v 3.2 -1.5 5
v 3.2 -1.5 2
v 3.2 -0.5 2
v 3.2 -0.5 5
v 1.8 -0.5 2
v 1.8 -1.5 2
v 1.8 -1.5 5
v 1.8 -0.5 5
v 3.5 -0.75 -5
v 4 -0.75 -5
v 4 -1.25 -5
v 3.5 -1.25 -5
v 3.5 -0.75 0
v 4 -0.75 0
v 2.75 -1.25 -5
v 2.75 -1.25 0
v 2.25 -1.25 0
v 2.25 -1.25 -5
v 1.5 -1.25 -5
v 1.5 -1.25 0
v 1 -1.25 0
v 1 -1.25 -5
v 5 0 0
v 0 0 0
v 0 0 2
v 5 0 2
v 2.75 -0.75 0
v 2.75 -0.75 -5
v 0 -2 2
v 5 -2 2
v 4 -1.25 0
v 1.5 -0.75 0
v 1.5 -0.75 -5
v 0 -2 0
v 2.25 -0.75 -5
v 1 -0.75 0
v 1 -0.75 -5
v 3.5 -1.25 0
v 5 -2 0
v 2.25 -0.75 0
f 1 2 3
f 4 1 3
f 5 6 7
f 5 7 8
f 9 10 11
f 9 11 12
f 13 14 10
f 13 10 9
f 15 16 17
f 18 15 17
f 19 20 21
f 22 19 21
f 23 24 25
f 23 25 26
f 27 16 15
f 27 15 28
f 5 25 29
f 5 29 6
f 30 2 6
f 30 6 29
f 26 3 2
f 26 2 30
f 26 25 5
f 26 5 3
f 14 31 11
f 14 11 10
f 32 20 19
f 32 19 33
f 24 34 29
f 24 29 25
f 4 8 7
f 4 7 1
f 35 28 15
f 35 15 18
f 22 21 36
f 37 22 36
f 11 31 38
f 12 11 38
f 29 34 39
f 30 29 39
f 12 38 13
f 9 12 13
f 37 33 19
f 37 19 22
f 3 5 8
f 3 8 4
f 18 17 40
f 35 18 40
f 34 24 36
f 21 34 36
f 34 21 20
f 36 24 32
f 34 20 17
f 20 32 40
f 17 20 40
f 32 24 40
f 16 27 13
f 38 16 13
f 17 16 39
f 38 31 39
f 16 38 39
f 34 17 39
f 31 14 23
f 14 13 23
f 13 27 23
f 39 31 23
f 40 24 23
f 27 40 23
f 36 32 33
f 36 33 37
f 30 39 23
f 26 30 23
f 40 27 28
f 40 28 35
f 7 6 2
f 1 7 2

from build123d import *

# Parameters (mm, degrees)
SKETCH_1_W      = 5
SKETCH_1_H      = 2
EXTRUDE_1_DEPTH = 2
SKETCH_2_W      = 0.5
SKETCH_2_H      = 0.5
EXTRUDE_2_DEPTH = 5
SKETCH_3_W      = 1.4
SKETCH_3_H      = 1
EXTRUDE_3_DEPTH = 3


with BuildPart() as part:
    # Эскиз1 → Бобышка-Вытянуть1 (new body)
    with BuildSketch(Plane.XY):
        with Locations((2.5, -1)):
            Rectangle(SKETCH_1_W, SKETCH_1_H)
    extrude(amount=EXTRUDE_1_DEPTH)

    # Эскиз2 → Бобышка-Вытянуть2 (add)
    with BuildSketch(Plane(origin=(0, 0, 0), x_dir=(-1, 0, 0), z_dir=(0, 0, -1))):
        with Locations((-1.25, -1)):
            Rectangle(SKETCH_2_W, SKETCH_2_H)
        with Locations((-2.5, -1)):
            Rectangle(SKETCH_2_W, SKETCH_2_H)
        with Locations((-3.75, -1)):
            Rectangle(SKETCH_2_W, SKETCH_2_H)
    extrude(amount=EXTRUDE_2_DEPTH)

    # Эскиз3 → Бобышка-Вытянуть3 (add)
    with BuildSketch(Plane.XY.offset(2)):
        with Locations((2.5, -1)):
            Rectangle(SKETCH_3_W, SKETCH_3_H)
    extrude(amount=EXTRUDE_3_DEPTH)


solid = part.part
